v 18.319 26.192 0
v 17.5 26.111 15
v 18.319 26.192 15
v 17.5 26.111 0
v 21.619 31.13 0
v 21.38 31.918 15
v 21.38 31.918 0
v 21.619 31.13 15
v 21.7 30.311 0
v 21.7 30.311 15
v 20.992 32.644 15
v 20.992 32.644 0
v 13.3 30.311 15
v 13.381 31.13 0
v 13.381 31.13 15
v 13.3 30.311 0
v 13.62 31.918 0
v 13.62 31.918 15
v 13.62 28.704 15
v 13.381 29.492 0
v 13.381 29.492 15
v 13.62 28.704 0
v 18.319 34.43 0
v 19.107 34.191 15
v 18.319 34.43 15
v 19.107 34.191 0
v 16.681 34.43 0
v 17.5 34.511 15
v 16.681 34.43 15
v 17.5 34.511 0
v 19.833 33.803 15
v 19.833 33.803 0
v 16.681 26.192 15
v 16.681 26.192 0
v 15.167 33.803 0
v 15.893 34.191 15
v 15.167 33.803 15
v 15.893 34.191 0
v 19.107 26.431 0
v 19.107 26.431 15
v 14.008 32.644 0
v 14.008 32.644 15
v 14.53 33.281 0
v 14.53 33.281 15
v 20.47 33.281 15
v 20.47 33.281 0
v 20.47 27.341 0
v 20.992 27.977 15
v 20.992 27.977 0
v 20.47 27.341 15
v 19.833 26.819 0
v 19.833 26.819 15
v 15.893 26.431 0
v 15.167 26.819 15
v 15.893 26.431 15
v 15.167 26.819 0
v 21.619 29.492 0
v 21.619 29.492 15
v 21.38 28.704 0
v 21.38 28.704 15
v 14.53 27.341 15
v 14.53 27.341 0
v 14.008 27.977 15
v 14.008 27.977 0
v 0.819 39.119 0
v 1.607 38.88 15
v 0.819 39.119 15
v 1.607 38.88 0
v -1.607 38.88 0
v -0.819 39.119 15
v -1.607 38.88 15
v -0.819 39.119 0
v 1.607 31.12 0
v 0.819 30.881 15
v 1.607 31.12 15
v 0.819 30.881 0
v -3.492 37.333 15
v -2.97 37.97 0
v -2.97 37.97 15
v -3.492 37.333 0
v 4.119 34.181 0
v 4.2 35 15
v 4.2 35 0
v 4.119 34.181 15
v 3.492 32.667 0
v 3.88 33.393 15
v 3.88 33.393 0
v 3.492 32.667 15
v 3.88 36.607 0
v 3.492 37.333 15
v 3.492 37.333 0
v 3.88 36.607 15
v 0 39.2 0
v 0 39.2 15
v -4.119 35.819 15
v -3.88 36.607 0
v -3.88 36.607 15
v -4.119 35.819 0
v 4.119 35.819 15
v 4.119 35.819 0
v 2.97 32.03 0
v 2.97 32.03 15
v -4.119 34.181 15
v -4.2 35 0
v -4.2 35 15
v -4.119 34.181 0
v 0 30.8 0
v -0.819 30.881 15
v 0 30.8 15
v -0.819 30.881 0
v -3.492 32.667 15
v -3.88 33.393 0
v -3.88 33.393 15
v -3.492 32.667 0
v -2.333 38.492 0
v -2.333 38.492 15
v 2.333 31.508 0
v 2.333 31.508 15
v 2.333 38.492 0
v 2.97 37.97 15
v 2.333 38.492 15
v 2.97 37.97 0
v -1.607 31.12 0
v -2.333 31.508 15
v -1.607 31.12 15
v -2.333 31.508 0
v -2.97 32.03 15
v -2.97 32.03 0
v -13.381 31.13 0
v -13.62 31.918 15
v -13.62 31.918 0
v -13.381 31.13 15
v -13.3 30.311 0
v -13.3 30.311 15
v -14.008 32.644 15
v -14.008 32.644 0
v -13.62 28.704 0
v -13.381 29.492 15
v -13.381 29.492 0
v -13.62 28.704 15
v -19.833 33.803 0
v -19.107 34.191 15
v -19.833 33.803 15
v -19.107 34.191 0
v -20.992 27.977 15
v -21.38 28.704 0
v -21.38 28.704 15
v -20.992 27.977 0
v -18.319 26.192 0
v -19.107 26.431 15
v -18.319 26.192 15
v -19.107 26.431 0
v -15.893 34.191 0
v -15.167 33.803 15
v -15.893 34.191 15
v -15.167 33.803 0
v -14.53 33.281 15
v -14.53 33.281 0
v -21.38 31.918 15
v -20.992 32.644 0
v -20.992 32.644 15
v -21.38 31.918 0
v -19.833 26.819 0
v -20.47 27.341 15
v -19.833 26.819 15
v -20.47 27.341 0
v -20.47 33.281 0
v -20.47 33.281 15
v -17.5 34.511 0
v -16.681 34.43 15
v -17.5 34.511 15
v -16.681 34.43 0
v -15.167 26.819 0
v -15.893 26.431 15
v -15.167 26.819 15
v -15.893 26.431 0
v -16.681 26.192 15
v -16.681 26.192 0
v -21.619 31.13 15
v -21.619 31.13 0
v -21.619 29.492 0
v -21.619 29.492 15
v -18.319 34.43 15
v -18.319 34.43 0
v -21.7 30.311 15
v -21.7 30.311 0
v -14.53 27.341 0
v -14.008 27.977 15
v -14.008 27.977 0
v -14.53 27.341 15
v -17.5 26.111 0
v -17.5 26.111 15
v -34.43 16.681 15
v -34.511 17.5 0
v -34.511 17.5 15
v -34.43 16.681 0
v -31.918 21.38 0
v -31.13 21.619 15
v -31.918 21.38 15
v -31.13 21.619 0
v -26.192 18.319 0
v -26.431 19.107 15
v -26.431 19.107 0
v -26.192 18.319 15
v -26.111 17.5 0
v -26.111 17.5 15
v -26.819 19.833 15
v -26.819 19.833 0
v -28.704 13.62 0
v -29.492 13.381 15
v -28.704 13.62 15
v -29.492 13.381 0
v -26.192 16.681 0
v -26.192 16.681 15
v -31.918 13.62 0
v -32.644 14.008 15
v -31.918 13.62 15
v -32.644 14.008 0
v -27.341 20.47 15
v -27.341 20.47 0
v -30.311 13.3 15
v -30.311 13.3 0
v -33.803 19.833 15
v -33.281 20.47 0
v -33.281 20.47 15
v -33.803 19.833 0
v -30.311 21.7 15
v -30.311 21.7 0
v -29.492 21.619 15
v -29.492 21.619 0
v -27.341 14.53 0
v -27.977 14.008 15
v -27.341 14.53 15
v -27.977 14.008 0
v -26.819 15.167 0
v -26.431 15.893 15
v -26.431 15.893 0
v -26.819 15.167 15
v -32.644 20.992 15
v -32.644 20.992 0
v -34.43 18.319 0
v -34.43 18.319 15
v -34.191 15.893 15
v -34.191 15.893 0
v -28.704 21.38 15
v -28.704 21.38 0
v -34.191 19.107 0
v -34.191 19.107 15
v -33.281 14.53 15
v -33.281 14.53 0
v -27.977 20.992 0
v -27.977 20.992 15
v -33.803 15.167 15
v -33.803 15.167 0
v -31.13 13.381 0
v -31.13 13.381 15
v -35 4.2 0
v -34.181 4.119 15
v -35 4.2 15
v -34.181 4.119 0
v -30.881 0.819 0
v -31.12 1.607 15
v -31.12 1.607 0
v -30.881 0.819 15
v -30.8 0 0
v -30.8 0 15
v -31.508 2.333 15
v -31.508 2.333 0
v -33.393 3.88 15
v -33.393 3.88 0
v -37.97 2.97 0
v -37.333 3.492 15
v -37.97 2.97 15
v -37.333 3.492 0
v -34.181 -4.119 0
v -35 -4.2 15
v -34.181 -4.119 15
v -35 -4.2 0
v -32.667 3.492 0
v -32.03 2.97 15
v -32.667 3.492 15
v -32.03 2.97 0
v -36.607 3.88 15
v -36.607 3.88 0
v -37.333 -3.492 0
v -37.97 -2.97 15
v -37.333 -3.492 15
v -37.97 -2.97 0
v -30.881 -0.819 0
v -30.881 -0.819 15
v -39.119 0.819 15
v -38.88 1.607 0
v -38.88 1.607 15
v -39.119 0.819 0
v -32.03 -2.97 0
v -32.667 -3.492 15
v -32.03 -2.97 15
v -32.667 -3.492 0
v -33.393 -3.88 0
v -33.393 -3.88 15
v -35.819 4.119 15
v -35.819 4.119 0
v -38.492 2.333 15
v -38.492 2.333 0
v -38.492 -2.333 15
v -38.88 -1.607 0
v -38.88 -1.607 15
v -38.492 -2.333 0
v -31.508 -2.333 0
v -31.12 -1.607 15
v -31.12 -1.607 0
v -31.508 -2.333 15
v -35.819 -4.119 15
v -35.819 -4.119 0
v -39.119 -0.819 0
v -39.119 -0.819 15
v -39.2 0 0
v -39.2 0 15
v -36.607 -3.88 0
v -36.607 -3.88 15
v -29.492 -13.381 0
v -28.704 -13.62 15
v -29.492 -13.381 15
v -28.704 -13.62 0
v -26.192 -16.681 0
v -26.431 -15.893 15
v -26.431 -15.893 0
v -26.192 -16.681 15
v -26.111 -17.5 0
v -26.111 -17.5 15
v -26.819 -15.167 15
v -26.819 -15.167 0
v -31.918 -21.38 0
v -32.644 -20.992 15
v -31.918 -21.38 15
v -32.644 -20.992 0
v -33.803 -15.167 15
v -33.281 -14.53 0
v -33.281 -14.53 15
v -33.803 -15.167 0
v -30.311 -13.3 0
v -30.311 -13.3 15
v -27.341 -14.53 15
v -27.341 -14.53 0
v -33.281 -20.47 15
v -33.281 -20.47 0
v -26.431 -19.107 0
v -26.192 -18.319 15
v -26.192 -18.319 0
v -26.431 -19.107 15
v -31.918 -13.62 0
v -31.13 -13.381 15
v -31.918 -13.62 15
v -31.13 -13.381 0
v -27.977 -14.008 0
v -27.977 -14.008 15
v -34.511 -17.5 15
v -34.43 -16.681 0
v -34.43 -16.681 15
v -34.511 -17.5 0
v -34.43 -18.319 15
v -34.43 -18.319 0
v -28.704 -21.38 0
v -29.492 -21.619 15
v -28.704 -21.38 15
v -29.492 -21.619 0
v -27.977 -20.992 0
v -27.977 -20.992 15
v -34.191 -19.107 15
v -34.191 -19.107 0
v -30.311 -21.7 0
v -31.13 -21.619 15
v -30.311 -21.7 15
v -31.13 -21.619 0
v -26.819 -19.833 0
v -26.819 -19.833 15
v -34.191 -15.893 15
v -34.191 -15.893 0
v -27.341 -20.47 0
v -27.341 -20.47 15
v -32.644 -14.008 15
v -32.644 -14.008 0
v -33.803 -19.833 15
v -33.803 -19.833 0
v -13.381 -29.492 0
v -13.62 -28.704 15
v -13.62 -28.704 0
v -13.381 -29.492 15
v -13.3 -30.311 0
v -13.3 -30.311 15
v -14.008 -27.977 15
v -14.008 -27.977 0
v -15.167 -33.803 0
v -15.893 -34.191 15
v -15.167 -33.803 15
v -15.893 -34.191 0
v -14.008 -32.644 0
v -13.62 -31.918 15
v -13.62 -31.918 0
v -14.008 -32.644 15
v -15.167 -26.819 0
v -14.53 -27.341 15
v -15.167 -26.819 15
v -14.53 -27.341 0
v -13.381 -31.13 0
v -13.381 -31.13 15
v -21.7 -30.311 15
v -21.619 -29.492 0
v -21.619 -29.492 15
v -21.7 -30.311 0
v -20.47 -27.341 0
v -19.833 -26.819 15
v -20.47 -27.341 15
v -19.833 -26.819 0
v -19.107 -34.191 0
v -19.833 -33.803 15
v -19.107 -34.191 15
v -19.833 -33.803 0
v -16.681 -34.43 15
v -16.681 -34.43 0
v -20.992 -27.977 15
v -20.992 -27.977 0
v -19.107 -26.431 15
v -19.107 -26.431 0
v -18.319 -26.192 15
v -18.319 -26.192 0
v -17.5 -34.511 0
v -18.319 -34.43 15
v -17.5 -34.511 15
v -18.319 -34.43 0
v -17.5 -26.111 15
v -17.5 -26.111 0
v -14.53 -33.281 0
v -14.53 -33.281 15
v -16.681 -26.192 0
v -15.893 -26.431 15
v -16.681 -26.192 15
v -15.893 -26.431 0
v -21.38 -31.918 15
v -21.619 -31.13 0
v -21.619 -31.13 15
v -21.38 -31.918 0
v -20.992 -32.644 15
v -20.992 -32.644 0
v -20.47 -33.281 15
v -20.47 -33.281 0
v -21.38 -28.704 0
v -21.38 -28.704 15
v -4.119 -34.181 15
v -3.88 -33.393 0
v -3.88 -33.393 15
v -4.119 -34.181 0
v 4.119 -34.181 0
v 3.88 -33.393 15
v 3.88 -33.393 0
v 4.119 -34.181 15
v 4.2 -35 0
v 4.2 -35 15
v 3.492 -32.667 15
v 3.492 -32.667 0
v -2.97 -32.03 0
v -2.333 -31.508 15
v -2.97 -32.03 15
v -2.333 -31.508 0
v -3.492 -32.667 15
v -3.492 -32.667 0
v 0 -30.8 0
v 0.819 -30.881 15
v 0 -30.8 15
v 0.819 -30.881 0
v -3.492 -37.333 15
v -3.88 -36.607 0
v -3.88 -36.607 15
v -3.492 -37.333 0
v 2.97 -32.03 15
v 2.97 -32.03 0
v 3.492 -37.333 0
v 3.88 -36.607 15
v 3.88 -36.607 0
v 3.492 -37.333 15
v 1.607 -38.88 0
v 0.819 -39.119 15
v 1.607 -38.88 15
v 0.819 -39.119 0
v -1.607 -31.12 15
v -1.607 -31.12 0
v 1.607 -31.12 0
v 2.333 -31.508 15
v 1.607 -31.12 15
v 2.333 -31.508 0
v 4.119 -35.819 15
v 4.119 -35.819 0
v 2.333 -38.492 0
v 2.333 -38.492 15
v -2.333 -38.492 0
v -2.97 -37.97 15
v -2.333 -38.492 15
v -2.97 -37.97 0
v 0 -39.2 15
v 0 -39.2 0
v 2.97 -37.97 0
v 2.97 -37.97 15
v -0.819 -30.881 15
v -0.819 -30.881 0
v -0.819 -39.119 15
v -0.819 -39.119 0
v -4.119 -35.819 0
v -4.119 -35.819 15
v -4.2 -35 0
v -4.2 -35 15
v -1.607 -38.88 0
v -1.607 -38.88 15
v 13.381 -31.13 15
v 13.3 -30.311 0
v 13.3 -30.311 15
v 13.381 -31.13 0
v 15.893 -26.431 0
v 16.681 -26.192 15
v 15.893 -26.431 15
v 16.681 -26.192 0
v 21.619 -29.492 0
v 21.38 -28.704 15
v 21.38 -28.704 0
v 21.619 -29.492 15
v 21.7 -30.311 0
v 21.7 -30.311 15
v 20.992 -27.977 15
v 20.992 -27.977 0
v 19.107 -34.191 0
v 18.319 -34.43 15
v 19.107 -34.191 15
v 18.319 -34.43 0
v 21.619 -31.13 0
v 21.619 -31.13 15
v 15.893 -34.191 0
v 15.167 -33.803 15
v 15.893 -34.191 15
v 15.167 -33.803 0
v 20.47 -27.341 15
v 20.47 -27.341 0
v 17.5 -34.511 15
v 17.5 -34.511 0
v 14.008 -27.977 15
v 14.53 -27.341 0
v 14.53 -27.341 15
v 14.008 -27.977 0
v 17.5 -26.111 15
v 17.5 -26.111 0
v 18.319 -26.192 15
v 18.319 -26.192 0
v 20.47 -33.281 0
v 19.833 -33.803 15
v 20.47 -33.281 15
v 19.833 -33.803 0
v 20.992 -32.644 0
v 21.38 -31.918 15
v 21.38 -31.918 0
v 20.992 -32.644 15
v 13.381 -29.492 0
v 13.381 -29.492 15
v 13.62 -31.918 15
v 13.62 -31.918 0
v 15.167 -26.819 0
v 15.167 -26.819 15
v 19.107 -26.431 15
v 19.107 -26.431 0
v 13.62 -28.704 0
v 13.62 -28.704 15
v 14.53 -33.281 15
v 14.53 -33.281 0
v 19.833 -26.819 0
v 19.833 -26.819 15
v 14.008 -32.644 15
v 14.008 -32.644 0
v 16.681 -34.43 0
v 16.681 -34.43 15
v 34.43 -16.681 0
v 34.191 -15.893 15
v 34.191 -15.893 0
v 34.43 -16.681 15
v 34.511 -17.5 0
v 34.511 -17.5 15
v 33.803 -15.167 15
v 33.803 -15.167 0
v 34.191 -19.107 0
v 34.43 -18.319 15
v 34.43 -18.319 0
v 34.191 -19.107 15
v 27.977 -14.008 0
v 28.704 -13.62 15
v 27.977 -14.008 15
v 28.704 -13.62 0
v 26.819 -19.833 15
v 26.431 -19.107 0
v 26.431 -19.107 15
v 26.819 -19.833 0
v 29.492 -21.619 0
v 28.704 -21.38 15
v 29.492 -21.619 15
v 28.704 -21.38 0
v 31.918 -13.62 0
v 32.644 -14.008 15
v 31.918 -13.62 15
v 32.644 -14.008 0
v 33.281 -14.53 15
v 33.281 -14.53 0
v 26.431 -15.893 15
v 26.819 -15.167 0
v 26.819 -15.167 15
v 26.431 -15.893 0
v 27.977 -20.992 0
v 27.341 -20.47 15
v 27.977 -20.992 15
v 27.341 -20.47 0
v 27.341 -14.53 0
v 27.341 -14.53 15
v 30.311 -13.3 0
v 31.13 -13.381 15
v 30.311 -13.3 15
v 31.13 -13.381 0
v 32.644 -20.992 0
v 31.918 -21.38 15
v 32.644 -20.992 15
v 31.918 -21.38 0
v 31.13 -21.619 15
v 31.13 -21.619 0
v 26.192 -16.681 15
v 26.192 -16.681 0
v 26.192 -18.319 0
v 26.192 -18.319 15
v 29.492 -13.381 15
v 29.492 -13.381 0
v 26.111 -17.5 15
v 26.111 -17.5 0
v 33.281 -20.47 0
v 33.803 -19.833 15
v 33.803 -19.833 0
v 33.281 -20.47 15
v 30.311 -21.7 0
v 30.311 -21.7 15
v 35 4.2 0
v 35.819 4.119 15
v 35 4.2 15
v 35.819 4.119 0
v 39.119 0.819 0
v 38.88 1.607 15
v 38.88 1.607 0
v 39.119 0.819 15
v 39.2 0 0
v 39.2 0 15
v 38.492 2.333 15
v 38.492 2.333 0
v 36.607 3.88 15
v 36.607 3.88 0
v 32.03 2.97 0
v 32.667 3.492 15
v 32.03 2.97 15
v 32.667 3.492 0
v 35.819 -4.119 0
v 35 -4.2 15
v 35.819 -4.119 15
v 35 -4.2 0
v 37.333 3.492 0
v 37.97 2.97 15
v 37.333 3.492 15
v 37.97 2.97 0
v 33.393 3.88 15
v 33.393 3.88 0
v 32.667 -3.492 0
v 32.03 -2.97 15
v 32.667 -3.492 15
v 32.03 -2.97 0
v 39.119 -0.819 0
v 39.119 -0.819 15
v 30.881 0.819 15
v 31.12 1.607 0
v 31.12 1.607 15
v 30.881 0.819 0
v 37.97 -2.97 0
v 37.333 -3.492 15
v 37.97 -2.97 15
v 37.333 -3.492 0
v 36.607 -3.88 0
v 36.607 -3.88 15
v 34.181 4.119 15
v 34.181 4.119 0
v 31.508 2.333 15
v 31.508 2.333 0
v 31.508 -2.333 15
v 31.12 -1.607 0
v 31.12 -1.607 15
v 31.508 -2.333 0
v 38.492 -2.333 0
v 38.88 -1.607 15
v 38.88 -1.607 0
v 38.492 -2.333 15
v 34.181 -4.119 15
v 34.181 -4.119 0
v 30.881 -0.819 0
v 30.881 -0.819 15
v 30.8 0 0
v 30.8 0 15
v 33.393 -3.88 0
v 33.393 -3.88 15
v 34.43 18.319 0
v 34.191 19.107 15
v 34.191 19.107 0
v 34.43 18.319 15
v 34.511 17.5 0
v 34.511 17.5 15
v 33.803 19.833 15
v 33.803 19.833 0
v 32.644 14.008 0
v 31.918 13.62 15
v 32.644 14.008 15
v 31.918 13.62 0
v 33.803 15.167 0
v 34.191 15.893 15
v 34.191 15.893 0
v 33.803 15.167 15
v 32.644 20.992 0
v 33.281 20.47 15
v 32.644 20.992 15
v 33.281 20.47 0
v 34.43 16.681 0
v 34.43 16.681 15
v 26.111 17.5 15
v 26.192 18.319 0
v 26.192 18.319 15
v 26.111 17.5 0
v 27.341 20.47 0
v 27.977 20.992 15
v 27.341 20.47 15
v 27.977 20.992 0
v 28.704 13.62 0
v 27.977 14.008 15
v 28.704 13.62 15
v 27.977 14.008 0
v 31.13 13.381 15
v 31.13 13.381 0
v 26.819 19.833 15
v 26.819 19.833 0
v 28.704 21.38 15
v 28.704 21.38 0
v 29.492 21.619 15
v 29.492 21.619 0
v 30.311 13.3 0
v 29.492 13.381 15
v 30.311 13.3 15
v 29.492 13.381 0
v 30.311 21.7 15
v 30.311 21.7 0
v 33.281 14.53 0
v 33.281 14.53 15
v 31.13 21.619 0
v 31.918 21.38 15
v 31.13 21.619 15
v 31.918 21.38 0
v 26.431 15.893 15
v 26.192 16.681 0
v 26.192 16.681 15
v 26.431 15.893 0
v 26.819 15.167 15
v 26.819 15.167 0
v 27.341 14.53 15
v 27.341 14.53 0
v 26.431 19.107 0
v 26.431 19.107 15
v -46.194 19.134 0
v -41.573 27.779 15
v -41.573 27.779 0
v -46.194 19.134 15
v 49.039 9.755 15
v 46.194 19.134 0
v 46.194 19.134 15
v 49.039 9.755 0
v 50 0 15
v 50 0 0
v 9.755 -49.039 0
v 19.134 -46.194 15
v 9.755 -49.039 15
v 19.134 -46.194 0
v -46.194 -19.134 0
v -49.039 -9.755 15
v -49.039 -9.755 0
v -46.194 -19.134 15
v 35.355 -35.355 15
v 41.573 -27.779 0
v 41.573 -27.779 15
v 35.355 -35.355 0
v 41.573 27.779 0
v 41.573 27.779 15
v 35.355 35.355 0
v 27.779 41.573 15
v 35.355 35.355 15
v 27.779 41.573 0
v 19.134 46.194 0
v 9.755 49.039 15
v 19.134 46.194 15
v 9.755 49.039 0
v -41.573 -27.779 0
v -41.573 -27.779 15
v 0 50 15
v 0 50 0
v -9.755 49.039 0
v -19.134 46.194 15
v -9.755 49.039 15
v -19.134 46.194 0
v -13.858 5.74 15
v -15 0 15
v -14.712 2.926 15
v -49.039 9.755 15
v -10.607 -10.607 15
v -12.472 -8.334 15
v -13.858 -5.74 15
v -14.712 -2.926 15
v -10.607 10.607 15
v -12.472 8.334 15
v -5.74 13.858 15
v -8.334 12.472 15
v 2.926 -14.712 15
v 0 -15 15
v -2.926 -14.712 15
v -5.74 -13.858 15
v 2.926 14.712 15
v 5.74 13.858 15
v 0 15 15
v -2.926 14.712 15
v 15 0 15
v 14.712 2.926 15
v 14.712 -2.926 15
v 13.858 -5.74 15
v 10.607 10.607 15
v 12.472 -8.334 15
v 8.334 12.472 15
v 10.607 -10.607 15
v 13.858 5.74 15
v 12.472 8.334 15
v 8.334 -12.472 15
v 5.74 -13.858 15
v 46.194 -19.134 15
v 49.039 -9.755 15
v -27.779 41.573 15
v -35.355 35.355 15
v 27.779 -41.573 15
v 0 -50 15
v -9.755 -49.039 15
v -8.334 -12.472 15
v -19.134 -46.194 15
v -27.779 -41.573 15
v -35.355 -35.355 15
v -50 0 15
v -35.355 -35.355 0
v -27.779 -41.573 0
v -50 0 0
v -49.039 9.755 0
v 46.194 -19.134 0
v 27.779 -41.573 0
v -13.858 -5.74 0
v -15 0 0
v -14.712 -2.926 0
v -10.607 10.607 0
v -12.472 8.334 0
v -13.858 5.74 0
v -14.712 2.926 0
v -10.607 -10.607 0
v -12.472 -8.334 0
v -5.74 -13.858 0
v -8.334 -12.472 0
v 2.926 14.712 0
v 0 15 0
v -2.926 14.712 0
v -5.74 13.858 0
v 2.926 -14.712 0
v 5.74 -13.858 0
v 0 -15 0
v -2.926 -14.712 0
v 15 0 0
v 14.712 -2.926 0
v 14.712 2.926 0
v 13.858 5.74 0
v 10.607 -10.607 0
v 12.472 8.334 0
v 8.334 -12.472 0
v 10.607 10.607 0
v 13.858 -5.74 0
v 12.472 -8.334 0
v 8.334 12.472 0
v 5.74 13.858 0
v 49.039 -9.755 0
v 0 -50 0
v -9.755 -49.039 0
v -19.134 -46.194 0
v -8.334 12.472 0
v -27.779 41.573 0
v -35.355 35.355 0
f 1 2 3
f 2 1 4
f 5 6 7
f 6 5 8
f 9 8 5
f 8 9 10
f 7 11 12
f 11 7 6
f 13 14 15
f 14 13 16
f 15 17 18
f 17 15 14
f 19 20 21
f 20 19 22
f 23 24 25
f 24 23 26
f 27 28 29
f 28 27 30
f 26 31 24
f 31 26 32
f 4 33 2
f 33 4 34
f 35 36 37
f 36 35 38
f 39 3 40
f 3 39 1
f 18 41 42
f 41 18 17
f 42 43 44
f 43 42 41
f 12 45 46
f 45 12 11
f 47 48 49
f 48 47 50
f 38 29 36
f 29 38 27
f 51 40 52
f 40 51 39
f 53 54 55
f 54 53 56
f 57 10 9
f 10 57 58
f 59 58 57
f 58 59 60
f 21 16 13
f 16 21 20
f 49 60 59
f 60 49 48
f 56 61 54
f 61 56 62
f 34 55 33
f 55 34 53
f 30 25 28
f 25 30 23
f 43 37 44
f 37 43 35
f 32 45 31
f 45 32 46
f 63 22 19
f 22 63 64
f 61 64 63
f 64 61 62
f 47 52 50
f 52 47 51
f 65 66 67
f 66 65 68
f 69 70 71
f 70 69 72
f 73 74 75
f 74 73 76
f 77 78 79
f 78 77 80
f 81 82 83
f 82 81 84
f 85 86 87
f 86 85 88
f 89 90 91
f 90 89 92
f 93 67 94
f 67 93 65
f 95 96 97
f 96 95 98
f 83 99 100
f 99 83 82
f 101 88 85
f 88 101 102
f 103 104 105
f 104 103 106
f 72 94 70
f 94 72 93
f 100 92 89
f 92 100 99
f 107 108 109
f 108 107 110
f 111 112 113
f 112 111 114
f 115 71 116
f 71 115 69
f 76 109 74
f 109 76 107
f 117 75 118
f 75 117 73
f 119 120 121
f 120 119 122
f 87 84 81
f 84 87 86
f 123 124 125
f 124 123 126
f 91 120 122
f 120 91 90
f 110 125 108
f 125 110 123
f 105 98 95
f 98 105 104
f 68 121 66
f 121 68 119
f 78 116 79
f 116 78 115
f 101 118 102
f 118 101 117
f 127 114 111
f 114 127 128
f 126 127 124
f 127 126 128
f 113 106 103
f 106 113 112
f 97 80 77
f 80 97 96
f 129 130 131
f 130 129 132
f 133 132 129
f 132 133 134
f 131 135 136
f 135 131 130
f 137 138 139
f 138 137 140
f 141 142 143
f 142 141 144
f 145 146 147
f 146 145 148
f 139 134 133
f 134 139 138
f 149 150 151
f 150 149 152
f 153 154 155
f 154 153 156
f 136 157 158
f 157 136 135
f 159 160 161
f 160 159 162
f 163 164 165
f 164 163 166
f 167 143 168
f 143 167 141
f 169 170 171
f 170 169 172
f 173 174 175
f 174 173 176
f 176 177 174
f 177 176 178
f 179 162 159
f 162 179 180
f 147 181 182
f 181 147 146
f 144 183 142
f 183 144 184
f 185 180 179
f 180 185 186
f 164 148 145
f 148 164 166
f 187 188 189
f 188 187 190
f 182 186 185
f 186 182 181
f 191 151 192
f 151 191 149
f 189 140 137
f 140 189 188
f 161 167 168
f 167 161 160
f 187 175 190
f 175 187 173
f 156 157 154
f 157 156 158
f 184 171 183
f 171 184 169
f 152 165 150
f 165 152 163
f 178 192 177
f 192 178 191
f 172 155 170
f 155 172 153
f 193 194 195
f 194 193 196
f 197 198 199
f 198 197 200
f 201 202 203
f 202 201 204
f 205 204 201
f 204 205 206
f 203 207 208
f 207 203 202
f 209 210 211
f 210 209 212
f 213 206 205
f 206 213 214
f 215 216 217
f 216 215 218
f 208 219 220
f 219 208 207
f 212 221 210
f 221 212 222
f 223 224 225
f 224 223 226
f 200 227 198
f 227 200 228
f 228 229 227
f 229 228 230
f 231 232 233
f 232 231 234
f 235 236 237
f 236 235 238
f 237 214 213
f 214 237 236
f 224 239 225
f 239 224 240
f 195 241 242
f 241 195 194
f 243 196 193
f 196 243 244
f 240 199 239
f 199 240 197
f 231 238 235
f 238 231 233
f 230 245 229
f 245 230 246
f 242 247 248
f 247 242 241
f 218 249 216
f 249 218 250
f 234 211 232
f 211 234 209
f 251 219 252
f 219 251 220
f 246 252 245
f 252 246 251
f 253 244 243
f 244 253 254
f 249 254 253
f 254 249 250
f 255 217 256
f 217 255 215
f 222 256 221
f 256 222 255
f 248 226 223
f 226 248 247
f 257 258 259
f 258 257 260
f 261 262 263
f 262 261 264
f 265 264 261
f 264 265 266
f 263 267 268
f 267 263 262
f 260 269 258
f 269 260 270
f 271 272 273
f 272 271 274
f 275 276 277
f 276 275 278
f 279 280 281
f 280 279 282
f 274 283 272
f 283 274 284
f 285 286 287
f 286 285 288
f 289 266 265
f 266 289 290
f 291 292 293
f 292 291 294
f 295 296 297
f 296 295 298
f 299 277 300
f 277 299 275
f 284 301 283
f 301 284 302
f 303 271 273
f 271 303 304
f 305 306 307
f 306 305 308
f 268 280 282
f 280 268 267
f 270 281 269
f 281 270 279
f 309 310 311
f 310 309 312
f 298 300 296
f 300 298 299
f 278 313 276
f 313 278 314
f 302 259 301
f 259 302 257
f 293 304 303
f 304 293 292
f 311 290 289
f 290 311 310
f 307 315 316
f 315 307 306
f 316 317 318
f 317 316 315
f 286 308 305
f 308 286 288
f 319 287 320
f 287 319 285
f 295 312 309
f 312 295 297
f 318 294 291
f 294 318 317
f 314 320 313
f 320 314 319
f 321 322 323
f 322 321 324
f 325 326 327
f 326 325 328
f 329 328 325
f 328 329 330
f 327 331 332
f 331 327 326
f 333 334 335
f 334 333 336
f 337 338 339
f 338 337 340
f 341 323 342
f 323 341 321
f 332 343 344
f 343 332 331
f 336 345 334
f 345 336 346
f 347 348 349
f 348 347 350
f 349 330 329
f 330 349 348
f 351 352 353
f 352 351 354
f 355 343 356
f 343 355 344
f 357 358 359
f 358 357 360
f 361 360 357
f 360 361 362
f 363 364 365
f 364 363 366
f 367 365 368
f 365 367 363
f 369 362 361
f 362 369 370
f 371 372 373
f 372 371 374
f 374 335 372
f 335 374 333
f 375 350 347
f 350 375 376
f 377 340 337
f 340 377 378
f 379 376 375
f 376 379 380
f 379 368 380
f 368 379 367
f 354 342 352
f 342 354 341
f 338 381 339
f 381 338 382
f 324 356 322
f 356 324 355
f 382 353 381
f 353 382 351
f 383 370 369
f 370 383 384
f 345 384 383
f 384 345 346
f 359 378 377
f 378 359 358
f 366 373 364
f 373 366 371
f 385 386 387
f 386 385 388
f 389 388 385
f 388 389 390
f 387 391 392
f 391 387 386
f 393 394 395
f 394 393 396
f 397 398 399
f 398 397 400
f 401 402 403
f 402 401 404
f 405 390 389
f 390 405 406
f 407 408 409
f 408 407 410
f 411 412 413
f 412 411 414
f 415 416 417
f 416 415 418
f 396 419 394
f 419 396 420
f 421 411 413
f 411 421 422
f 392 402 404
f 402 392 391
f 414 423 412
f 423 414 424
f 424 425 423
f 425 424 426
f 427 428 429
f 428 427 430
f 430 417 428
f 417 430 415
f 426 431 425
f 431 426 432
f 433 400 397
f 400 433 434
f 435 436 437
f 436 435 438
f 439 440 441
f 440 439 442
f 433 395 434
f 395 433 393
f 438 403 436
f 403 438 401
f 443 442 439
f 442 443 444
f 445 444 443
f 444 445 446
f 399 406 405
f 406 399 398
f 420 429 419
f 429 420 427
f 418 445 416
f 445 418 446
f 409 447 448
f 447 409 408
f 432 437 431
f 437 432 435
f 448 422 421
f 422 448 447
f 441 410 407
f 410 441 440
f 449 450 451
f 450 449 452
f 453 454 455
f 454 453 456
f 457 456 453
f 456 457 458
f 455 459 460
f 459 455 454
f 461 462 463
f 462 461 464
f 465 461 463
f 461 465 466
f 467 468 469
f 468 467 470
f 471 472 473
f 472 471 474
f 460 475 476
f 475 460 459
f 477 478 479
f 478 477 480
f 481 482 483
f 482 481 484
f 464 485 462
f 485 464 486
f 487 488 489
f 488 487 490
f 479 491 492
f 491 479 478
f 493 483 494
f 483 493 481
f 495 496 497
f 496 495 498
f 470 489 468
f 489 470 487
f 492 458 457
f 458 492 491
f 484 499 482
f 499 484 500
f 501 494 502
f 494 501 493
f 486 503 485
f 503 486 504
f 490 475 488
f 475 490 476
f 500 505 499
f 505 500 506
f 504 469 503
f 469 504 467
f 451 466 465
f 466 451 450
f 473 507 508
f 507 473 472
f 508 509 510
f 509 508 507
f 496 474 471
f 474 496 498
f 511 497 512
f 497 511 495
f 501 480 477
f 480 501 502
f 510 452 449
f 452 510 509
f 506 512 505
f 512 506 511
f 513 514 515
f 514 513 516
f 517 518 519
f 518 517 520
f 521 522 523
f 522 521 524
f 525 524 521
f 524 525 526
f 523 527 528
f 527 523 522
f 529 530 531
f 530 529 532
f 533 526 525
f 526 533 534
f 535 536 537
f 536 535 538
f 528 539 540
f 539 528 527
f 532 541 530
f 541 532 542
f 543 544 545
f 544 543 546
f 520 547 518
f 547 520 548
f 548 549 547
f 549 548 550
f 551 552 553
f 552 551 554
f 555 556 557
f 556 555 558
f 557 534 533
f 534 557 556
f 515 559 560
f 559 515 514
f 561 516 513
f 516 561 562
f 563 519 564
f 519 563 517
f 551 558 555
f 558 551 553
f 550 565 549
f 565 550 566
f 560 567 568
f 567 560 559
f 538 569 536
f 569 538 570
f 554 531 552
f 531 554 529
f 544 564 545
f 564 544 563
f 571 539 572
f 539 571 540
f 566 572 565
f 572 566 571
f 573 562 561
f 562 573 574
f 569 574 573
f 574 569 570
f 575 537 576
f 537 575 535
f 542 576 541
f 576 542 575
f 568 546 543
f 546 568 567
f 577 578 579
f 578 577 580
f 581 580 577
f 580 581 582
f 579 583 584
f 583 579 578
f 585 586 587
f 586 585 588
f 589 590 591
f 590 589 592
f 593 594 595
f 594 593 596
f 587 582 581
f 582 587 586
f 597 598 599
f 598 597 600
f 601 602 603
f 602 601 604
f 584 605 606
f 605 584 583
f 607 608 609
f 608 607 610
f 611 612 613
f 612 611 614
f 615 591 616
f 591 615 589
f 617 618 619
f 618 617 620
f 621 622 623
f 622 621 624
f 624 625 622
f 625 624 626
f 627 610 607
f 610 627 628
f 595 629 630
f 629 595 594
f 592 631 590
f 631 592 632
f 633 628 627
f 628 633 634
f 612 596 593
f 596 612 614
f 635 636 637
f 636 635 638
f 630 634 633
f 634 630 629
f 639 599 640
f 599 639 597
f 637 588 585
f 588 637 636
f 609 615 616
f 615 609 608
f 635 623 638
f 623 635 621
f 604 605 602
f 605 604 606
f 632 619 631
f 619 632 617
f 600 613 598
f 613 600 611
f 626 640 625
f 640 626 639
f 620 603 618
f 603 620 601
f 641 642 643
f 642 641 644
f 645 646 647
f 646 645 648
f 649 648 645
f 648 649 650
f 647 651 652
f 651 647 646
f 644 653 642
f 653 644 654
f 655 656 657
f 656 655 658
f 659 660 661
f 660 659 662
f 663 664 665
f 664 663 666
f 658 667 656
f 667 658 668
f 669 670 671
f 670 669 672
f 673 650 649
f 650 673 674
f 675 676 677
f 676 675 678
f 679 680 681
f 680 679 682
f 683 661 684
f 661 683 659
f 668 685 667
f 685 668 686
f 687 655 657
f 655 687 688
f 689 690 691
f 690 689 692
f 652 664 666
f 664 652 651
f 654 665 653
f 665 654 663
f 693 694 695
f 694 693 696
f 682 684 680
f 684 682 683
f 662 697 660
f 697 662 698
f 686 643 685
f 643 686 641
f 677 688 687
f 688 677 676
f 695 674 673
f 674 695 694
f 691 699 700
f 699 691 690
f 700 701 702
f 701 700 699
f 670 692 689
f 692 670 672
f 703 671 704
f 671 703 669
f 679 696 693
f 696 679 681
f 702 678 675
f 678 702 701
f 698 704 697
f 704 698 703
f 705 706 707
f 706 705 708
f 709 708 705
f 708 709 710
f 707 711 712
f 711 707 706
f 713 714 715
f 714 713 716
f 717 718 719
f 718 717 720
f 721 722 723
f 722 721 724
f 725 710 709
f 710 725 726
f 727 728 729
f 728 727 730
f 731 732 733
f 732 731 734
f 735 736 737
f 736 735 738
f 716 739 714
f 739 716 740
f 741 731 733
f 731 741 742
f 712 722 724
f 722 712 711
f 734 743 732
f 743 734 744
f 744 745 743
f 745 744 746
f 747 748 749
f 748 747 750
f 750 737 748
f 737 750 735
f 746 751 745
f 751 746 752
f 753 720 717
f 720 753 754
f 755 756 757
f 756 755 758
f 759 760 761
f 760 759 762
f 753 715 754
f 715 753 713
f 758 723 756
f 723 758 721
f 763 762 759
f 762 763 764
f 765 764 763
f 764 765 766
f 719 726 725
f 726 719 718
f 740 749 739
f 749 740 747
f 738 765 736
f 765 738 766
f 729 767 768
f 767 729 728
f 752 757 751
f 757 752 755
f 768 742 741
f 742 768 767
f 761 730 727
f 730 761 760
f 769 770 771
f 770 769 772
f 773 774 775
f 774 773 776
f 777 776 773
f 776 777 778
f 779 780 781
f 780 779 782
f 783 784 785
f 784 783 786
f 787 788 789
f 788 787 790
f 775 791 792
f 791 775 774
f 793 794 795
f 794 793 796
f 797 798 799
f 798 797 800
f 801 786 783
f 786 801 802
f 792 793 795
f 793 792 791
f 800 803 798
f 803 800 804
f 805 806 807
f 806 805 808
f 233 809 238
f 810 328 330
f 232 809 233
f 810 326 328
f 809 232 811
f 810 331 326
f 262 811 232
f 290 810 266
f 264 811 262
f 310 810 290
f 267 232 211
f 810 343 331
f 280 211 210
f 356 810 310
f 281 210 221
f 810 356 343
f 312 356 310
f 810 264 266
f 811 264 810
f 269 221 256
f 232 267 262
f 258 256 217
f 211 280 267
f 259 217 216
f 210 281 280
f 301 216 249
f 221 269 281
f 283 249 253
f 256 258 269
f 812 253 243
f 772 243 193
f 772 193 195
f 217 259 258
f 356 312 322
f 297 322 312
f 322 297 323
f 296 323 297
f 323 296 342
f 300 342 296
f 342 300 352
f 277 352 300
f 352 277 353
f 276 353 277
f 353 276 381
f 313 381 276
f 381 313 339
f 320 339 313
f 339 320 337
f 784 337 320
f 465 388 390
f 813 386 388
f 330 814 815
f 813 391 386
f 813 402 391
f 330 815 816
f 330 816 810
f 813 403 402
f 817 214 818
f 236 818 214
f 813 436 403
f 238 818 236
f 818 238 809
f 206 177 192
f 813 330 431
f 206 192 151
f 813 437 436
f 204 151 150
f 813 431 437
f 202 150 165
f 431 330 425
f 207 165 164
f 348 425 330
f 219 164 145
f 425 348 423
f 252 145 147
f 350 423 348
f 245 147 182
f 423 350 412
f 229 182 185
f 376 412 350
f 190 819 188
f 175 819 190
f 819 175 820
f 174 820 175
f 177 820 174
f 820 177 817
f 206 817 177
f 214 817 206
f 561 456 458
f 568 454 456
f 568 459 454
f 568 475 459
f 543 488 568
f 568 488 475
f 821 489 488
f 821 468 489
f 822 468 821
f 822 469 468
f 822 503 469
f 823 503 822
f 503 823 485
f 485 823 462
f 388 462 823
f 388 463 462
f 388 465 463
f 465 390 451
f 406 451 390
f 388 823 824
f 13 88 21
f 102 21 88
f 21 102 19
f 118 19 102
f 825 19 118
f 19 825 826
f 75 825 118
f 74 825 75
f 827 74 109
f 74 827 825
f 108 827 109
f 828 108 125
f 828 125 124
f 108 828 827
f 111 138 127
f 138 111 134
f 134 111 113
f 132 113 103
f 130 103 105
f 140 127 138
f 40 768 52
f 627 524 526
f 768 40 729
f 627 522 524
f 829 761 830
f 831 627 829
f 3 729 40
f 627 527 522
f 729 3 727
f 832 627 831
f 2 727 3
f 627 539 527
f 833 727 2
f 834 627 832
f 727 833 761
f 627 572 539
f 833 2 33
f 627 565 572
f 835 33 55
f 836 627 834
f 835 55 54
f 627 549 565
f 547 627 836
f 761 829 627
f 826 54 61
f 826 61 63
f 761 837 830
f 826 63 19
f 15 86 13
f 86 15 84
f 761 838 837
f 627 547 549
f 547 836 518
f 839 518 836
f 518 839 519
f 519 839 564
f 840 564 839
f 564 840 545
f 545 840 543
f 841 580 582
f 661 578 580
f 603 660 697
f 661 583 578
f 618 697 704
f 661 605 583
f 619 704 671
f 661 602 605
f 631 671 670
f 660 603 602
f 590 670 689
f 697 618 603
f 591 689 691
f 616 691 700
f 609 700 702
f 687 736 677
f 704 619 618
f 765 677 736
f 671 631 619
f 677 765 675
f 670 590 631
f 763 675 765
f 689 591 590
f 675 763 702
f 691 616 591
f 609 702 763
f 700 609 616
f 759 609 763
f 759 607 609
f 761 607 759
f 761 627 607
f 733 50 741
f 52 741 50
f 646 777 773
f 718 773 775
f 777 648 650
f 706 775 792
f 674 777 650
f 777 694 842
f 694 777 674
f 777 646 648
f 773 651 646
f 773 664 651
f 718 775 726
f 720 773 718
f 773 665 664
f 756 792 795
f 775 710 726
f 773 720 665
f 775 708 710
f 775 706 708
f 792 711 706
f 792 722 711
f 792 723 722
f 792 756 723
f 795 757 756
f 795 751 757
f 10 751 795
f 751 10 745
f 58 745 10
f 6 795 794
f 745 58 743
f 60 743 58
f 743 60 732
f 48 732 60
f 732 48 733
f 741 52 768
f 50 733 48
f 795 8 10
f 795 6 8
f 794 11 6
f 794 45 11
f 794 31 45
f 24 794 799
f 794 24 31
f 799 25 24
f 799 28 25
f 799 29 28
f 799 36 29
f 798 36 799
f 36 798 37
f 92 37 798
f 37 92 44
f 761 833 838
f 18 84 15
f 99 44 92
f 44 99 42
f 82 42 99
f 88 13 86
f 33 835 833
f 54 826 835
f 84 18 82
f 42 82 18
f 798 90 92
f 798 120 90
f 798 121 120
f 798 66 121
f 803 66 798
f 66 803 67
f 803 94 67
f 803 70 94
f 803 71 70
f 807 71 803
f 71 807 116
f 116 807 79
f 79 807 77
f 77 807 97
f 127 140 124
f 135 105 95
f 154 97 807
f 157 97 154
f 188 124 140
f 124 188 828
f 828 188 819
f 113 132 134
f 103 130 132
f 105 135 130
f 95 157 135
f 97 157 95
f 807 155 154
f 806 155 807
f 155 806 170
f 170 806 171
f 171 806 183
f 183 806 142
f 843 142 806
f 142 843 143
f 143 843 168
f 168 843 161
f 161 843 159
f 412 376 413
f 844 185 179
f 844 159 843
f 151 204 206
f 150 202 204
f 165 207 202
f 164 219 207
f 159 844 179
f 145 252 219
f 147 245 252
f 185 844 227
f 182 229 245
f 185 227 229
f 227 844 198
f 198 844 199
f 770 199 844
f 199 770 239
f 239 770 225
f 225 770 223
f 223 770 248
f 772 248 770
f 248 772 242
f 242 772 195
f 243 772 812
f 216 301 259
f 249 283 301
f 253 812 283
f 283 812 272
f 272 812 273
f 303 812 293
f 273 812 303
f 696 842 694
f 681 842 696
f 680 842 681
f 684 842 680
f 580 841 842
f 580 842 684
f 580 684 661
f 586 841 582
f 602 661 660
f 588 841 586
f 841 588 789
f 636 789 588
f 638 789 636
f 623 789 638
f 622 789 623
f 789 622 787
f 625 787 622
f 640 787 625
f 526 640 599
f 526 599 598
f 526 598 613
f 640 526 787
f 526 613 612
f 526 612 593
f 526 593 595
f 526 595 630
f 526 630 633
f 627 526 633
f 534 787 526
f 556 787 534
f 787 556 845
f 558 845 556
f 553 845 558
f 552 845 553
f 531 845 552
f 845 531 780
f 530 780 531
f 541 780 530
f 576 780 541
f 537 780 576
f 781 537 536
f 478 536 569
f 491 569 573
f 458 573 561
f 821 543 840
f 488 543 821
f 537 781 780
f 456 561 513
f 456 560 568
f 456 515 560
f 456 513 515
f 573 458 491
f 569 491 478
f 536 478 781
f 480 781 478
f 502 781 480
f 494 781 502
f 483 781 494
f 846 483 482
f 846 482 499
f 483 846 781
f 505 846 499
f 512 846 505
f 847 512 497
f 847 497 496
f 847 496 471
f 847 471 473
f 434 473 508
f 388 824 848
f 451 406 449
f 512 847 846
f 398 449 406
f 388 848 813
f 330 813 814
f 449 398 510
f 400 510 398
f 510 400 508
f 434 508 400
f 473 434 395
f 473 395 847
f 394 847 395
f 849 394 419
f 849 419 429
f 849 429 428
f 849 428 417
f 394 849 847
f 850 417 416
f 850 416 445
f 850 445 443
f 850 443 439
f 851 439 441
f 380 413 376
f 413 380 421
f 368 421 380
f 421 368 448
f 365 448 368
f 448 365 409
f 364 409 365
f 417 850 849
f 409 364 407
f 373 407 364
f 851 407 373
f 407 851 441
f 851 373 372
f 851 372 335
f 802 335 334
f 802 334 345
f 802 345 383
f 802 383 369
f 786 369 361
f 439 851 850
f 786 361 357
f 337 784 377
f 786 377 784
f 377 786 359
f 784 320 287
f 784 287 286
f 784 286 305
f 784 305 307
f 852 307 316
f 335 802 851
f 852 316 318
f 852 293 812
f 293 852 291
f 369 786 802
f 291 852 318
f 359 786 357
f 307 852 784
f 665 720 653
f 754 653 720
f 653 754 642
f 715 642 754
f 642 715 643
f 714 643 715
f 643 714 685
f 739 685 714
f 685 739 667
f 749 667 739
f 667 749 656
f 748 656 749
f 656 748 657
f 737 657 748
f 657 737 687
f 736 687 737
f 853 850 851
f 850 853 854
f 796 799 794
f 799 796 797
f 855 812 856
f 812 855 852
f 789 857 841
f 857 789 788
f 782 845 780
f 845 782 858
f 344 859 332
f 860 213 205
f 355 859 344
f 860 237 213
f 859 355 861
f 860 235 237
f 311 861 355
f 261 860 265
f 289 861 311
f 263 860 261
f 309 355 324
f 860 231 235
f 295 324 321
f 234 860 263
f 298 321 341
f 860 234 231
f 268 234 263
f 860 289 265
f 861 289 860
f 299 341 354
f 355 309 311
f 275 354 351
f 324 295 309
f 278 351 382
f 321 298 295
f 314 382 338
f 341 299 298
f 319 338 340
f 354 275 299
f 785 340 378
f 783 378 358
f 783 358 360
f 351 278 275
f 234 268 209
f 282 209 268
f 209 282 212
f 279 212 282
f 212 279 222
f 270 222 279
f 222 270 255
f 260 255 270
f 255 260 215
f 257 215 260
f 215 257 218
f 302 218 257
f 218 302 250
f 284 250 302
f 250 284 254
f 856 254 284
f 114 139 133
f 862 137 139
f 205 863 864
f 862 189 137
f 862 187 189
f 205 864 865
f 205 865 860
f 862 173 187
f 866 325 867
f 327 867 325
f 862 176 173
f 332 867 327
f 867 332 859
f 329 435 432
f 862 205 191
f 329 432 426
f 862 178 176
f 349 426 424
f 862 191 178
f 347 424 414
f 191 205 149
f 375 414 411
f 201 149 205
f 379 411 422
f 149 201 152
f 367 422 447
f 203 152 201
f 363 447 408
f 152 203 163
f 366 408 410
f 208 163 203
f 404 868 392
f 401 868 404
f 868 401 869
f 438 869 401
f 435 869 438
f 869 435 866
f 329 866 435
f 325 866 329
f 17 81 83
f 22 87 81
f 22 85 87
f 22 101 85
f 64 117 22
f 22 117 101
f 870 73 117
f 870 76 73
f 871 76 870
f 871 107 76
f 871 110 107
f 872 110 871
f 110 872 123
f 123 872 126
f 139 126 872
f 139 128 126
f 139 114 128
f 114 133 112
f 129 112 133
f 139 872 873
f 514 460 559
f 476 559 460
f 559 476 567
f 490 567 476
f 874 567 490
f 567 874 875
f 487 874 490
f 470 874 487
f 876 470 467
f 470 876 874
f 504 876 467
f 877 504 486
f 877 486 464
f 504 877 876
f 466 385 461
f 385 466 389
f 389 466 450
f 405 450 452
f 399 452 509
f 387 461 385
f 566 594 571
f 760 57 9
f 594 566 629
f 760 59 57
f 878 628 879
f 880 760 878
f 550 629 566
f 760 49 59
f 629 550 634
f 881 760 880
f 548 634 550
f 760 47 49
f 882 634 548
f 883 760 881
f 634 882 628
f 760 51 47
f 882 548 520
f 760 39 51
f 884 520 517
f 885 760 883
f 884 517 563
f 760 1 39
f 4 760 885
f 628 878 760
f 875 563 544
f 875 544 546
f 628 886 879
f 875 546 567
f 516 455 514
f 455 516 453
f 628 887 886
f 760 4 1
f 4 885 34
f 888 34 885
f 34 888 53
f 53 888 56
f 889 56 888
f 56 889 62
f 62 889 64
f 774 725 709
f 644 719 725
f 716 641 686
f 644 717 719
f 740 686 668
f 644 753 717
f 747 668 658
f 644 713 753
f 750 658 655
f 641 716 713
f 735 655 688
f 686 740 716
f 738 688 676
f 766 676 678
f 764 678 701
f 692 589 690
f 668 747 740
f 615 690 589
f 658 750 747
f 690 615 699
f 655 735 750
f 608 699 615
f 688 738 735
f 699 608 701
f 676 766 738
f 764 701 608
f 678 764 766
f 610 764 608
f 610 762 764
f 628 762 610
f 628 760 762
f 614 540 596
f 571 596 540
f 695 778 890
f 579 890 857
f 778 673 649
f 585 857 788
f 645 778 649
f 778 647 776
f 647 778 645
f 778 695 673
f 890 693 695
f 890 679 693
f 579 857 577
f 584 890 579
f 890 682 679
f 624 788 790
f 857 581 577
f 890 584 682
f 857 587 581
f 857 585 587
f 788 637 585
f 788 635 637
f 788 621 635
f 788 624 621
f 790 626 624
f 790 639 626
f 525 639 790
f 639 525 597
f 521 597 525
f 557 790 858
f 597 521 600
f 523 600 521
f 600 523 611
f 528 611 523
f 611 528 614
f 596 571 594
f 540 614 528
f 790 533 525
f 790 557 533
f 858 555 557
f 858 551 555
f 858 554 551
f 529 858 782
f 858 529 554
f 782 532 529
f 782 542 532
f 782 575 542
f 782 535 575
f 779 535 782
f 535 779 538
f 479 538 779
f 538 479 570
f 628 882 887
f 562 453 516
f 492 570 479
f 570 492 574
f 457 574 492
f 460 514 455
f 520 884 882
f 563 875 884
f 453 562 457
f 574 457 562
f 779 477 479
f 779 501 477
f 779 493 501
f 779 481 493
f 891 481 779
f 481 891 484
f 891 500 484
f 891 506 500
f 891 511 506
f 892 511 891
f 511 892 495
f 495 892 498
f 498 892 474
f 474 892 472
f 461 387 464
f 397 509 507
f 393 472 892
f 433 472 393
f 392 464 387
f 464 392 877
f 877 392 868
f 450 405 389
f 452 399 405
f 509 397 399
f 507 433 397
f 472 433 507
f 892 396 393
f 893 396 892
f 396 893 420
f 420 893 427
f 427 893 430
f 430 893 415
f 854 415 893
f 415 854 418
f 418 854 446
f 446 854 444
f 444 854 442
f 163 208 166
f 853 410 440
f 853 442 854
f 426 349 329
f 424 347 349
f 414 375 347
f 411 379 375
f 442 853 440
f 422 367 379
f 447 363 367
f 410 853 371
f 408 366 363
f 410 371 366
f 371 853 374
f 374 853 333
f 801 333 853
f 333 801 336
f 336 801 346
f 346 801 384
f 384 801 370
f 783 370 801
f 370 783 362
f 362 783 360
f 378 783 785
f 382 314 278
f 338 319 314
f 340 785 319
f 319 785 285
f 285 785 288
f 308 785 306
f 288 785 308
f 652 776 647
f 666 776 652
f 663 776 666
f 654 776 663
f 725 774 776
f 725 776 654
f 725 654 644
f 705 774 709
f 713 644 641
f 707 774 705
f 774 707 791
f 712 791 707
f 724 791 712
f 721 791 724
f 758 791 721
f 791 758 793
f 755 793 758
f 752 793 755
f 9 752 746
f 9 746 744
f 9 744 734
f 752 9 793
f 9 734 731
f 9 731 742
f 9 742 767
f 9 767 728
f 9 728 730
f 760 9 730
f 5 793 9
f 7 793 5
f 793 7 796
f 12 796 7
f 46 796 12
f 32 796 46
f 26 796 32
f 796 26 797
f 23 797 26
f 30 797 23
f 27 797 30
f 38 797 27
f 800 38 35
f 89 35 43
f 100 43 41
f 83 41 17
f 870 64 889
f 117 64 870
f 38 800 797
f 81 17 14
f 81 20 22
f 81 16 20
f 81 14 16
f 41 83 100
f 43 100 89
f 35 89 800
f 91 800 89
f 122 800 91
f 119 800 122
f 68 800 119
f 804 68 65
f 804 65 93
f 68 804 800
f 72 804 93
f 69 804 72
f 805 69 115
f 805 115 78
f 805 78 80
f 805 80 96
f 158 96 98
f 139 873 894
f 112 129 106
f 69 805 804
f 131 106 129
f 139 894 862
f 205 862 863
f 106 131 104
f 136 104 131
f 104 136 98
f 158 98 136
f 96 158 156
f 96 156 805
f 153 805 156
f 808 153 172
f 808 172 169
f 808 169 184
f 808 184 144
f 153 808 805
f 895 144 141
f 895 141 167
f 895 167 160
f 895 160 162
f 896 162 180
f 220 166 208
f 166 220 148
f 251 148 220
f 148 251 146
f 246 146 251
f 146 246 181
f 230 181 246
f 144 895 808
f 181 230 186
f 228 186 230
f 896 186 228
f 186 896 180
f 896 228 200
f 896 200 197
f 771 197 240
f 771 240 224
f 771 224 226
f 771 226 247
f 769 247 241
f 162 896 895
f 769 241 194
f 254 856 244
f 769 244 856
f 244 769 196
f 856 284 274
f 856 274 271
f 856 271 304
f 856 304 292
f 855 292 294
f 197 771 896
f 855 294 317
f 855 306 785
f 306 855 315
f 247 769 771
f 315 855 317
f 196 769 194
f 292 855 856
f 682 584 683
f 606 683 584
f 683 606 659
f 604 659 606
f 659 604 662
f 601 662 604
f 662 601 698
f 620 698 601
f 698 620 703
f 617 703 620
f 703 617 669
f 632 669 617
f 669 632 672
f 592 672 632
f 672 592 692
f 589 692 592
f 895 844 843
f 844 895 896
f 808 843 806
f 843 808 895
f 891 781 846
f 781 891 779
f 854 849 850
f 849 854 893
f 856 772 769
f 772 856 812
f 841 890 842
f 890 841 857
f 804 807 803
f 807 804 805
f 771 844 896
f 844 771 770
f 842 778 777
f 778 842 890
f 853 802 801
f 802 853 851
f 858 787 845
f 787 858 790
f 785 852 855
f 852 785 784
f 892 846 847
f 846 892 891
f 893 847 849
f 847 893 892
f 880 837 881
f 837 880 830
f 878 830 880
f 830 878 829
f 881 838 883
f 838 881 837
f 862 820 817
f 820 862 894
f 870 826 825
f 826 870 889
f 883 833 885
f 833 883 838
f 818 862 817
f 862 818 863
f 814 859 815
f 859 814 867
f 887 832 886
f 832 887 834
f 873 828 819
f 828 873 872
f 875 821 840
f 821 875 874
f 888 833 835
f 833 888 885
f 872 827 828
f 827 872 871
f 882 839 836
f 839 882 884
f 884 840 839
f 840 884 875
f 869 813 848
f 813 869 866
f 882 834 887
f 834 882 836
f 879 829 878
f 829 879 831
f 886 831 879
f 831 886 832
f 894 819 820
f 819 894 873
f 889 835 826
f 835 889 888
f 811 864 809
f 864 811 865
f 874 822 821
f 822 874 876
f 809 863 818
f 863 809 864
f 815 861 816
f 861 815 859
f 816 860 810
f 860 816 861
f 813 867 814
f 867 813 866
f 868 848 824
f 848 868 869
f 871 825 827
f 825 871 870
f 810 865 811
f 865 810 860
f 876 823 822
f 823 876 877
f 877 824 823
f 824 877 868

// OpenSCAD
$fn = 32;

// ----------------------------------------------------------------------
// Flange Ø100 x 15
// 12 holes on a Ø70 bolt circle, bolted joints
// ----------------------------------------------------------------------

// --- parameters (mm) ---
flange_d = 100;  // outside diameter of the flange
thickness = 15;  // flange thickness
holes = 12;      // number of bolt holes
pcd = 70;        // bolt circle diameter
start_deg = 60;  // angle of the first hole, from +X
hole_d = 8.4;    // bolt hole diameter
bore_d = 30;     // central through bore
hub_d = 40;      // hub outside diameter
hub_h = 0;       // hub height above the flange face (0 = no hub)

// --- derived feature positions (mm) ---
height = thickness + hub_h;  // = 15   overall height of the part
pcd_r = pcd / 2;             // = 35   bolt circle radius
hole_step = 360 / holes;     // = 30   angular pitch
feature_centers = [
  [pcd_r * cos(start_deg + 0 * hole_step), pcd_r * sin(start_deg + 0 * hole_step)],
  [pcd_r * cos(start_deg + 1 * hole_step), pcd_r * sin(start_deg + 1 * hole_step)],
  [pcd_r * cos(start_deg + 2 * hole_step), pcd_r * sin(start_deg + 2 * hole_step)],
  [pcd_r * cos(start_deg + 3 * hole_step), pcd_r * sin(start_deg + 3 * hole_step)],
  [pcd_r * cos(start_deg + 4 * hole_step), pcd_r * sin(start_deg + 4 * hole_step)],
  [pcd_r * cos(start_deg + 5 * hole_step), pcd_r * sin(start_deg + 5 * hole_step)],
  [pcd_r * cos(start_deg + 6 * hole_step), pcd_r * sin(start_deg + 6 * hole_step)],
  [pcd_r * cos(start_deg + 7 * hole_step), pcd_r * sin(start_deg + 7 * hole_step)],
  [pcd_r * cos(start_deg + 8 * hole_step), pcd_r * sin(start_deg + 8 * hole_step)],
  [pcd_r * cos(start_deg + 9 * hole_step), pcd_r * sin(start_deg + 9 * hole_step)],
  [pcd_r * cos(start_deg + 10 * hole_step), pcd_r * sin(start_deg + 10 * hole_step)],
  [pcd_r * cos(start_deg + 11 * hole_step), pcd_r * sin(start_deg + 11 * hole_step)]
];   // bolt hole centres on the pitch circle

// flange disc, every hole and the bore cut straight through
difference() {
  union() {
    cylinder(d = flange_d, h = thickness);
  }
  translate([0, 0, -1]) cylinder(d = bore_d, h = height + 2);  // bore, through
  for (centre = feature_centers)
    translate([centre[0], centre[1], -1]) cylinder(d = hole_d, h = thickness + 2);
}
